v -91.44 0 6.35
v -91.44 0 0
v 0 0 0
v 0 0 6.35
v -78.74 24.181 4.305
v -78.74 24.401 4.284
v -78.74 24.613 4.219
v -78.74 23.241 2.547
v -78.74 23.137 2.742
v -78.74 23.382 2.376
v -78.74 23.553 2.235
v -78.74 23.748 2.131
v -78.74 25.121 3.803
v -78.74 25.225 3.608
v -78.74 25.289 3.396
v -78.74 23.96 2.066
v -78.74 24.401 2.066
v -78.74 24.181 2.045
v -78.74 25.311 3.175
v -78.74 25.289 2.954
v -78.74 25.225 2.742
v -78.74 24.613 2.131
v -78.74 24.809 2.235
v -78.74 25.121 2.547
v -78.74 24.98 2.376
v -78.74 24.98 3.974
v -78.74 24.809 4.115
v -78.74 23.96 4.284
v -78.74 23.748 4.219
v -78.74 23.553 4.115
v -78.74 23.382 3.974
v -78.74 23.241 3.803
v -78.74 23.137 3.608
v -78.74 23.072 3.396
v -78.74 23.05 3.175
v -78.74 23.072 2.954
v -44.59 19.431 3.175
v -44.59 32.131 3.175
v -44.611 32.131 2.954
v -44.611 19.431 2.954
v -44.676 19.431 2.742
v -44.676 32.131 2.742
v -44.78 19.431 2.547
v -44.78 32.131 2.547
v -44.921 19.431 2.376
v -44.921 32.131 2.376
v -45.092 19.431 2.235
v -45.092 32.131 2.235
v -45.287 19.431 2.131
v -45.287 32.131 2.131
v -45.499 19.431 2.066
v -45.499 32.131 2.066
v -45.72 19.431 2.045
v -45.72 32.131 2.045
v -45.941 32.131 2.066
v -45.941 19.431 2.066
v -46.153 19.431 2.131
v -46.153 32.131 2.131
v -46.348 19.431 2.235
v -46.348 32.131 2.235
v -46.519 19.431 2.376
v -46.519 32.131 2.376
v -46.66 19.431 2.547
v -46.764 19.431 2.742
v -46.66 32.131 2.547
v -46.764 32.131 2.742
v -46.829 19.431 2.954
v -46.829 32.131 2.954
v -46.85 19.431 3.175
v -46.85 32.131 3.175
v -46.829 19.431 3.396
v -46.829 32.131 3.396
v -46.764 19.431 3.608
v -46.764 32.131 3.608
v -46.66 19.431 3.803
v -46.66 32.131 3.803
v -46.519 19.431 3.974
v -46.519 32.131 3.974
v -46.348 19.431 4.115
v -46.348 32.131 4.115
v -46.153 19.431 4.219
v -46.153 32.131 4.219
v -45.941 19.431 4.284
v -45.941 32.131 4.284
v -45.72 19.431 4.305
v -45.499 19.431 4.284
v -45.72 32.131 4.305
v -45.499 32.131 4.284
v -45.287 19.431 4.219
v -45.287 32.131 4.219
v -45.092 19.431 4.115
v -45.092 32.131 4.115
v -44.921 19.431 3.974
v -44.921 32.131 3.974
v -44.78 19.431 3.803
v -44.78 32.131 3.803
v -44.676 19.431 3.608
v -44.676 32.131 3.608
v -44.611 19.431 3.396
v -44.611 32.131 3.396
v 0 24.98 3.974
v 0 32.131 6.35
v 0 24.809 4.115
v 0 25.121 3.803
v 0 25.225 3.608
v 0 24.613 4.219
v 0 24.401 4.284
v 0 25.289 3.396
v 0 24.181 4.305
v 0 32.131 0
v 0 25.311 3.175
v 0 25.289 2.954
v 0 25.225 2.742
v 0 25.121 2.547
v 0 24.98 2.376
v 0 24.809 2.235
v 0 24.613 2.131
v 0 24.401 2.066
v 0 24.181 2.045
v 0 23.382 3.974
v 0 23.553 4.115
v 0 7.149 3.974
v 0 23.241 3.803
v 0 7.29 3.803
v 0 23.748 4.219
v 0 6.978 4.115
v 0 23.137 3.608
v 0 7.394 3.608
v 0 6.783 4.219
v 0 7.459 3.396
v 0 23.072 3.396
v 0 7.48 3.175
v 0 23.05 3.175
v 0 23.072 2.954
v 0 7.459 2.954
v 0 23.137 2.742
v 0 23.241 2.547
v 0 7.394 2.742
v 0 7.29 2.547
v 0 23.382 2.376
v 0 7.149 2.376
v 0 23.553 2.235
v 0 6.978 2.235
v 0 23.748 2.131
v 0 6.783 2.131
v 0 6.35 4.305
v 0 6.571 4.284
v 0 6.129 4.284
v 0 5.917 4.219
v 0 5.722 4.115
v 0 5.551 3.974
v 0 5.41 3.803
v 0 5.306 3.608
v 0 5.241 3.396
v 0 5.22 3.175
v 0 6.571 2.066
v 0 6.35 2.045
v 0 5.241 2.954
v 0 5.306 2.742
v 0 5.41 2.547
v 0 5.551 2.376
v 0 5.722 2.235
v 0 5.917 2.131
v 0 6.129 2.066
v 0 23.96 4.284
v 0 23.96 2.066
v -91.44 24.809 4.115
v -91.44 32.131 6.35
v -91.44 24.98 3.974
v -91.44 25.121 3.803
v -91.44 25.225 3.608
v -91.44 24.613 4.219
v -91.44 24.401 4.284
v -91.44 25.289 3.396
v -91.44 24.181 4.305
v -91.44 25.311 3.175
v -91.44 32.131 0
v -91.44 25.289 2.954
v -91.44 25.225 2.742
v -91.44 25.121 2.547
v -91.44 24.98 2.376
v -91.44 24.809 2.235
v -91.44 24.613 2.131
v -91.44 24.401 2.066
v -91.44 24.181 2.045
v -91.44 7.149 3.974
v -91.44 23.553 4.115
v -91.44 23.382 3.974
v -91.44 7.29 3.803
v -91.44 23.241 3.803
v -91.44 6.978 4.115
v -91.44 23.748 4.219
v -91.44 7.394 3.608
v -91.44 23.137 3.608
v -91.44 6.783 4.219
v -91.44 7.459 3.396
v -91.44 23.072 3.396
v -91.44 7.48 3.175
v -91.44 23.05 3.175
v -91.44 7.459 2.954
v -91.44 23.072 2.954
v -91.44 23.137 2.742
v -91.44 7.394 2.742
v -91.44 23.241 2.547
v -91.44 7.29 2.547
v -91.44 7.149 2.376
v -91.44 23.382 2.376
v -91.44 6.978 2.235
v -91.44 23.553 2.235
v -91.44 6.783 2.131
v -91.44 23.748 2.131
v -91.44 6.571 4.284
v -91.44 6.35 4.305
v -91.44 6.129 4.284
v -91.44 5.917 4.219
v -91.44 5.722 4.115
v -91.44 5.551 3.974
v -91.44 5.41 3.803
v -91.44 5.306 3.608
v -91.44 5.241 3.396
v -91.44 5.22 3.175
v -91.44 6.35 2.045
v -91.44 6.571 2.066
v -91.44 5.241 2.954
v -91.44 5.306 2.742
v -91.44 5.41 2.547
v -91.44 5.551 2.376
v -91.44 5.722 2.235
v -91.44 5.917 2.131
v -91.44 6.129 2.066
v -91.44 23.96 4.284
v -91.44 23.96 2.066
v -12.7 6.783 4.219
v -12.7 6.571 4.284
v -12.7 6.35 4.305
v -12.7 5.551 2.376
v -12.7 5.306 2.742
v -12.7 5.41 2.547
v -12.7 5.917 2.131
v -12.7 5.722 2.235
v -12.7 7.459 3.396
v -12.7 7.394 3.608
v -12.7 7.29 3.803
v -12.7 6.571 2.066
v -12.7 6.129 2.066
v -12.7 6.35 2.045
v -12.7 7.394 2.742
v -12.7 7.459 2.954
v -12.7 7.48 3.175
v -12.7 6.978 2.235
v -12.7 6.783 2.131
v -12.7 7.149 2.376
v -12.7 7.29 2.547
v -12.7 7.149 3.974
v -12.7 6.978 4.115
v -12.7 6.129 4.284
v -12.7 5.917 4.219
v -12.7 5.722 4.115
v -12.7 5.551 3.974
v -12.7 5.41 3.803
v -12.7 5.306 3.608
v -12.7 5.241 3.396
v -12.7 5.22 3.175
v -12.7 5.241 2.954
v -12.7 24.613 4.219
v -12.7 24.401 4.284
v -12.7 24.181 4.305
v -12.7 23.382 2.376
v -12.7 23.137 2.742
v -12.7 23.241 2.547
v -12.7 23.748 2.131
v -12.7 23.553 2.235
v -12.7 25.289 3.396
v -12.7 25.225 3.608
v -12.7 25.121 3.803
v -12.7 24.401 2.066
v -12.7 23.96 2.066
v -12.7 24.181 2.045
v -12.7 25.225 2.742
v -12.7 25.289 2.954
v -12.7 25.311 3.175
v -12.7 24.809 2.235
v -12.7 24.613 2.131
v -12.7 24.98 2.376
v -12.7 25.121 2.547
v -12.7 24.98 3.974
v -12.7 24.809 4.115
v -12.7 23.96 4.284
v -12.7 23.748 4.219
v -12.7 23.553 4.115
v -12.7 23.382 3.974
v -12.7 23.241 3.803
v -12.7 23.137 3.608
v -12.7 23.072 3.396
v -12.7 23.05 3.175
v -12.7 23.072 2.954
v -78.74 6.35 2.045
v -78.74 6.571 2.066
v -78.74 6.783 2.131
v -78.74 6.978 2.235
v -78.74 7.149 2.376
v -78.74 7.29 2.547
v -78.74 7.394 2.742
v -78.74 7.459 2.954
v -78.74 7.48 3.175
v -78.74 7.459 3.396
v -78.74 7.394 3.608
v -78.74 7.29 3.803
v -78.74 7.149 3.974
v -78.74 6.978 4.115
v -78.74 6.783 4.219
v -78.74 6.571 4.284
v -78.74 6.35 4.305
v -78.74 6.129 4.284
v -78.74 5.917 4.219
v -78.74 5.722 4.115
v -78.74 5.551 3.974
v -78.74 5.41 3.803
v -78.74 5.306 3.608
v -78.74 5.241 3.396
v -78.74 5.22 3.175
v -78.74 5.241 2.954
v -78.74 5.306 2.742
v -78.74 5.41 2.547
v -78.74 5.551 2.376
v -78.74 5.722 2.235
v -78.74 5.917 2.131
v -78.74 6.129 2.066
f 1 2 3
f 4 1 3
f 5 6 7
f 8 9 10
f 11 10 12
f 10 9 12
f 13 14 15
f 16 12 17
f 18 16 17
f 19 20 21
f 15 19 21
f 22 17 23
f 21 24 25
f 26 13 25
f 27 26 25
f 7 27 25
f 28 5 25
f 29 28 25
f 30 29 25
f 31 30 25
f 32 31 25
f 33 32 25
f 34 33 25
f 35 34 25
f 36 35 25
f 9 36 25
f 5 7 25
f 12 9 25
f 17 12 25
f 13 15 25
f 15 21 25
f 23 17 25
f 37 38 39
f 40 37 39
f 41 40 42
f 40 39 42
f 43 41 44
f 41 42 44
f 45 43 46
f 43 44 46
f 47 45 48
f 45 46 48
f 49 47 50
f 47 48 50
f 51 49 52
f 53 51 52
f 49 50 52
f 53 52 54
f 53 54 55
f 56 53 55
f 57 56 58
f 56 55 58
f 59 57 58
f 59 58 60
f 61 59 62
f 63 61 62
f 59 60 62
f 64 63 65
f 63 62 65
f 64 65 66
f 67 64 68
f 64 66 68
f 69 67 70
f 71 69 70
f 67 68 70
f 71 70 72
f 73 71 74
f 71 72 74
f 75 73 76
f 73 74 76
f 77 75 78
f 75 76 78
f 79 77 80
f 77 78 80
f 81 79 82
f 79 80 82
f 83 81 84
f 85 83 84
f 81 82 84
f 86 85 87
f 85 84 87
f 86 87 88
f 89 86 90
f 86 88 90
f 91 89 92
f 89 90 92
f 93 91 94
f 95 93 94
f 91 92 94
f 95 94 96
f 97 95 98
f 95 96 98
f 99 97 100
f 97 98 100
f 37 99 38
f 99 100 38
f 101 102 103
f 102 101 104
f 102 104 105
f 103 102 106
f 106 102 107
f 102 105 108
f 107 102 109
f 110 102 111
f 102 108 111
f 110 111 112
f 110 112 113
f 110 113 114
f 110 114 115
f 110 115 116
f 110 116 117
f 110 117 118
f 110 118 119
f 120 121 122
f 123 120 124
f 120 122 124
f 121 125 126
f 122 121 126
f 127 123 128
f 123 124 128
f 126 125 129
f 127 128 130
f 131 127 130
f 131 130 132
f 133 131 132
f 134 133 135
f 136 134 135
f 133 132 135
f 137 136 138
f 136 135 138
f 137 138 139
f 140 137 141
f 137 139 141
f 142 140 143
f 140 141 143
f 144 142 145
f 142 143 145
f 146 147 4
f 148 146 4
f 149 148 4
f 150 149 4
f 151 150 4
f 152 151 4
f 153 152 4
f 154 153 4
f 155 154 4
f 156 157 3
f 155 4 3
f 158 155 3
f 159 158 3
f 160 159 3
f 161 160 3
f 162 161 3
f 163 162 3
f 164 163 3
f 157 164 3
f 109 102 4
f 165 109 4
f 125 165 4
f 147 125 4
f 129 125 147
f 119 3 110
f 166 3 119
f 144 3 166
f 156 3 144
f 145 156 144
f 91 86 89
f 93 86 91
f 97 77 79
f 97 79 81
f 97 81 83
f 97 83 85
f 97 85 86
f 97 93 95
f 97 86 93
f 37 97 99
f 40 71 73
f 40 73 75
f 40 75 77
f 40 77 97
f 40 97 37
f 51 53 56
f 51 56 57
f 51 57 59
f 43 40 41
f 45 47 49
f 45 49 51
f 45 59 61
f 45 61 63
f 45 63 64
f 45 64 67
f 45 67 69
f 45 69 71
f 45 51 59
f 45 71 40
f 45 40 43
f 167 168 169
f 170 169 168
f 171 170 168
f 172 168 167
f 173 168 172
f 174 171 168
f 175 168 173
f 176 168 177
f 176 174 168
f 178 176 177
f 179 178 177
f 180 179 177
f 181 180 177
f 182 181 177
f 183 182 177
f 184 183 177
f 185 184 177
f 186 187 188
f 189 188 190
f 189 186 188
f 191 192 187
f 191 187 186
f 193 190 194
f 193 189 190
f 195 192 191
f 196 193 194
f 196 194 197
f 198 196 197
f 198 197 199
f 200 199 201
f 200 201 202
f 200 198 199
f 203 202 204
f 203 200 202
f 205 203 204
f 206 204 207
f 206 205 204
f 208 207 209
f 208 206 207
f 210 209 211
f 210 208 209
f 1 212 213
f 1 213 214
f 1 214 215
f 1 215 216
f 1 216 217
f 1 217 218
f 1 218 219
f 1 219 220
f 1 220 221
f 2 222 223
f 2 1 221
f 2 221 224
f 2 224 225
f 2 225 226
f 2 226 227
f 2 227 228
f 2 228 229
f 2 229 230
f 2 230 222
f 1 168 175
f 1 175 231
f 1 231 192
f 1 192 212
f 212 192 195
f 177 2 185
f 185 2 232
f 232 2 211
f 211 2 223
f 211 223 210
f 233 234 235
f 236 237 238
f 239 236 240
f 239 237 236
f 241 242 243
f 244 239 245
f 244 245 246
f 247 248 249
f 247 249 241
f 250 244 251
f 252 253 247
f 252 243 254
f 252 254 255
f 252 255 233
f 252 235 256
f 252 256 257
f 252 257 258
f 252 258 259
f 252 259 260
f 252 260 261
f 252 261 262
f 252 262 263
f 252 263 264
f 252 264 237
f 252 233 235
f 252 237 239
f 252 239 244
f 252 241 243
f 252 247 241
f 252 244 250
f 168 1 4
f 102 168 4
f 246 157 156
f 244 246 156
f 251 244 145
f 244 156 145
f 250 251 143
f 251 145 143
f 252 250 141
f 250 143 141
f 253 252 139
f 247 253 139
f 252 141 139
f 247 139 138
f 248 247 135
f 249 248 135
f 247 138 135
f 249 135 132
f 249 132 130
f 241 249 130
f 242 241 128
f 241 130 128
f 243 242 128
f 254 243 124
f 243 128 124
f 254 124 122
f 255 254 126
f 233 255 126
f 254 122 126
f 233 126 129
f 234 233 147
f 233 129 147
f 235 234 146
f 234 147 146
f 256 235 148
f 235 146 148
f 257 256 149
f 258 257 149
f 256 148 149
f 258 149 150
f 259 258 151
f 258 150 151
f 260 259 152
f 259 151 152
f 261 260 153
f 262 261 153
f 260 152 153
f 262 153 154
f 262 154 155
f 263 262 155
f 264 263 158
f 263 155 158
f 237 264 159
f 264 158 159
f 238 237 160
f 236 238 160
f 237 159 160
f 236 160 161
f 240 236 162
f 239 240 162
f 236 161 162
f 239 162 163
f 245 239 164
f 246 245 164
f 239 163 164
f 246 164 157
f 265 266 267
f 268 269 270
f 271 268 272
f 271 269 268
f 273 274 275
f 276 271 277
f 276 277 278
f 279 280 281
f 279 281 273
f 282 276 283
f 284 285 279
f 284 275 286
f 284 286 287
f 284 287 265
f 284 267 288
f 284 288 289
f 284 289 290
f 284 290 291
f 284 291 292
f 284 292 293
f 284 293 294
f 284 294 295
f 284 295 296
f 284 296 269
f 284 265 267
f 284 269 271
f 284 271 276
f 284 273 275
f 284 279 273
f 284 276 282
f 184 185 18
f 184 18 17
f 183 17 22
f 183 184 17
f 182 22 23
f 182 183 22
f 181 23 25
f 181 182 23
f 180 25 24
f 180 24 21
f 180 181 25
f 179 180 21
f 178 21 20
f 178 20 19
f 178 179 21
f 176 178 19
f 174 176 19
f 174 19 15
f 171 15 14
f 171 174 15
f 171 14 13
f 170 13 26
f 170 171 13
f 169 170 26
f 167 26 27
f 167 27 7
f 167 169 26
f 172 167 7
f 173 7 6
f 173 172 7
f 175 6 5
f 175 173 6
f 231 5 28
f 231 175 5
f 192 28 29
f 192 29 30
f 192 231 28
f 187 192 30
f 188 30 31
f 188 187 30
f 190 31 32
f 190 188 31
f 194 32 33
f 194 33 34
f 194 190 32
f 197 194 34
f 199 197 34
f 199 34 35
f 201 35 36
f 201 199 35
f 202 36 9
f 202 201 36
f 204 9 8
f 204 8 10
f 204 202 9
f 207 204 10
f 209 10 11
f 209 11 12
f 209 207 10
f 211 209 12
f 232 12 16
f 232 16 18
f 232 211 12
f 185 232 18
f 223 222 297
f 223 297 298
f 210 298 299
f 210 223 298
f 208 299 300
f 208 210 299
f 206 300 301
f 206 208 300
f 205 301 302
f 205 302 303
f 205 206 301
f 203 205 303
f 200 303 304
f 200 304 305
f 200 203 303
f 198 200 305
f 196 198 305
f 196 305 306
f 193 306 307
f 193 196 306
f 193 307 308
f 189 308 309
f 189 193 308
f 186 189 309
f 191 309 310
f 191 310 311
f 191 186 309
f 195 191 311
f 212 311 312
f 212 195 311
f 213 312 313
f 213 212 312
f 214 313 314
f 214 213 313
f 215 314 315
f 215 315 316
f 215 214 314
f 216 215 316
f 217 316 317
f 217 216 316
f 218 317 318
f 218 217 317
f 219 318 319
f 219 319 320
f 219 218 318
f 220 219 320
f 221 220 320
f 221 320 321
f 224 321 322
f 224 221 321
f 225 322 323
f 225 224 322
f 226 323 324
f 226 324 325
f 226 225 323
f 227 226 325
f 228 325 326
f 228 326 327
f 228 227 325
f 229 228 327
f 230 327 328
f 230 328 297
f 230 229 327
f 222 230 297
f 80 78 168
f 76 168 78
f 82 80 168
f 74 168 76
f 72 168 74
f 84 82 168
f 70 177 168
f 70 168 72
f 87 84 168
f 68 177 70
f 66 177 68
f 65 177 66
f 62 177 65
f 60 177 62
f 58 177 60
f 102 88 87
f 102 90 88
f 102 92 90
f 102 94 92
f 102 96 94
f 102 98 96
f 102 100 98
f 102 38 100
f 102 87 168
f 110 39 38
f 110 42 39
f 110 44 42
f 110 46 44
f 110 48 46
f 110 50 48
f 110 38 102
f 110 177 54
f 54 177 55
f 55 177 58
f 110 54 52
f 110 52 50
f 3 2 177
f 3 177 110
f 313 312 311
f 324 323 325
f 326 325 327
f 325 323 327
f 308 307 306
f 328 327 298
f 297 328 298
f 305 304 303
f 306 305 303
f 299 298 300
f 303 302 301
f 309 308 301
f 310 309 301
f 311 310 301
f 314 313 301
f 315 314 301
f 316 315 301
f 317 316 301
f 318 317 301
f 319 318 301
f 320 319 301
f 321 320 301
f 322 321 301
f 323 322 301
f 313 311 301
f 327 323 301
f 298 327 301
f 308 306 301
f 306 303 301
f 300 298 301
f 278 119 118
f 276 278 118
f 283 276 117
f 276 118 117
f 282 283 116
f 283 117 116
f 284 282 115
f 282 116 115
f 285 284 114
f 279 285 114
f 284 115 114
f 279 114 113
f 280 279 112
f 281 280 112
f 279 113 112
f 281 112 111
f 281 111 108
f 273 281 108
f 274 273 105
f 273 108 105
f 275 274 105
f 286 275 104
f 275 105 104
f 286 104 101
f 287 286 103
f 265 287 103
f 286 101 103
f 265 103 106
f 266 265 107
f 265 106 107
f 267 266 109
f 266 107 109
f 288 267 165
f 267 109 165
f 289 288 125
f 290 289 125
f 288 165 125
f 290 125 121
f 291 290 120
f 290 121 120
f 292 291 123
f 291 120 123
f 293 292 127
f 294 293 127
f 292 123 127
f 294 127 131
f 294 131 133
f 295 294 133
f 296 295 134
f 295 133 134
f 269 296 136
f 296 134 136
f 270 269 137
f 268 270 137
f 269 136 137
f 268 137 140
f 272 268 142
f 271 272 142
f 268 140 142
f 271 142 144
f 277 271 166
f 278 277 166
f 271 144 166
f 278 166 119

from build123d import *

# Parameters (mm, degrees)
SKETCH1_W           = 91.44
SKETCH1_H           = 6.35
BOSS_EXTRUDE1_DEPTH = 32.131
SKETCH2_R           = 1.1303
CUT_EXTRUDE1_DEPTH  = 12.7
SKETCH3_R           = 1.1303
CUT_EXTRUDE2_DEPTH  = 12.7


with BuildPart() as part:
    # Sketch1 → Boss-Extrude1 (new body)
    with BuildSketch(Plane(origin=(0, 0, 0), x_dir=(1, 0, 0), z_dir=(0, 1, 0))):
        with Locations((-45.72, -3.175)):
            Rectangle(SKETCH1_W, SKETCH1_H)
    extrude(amount=BOSS_EXTRUDE1_DEPTH)

    # Sketch2 → Cut-Extrude1 (cut)
    with BuildSketch(Plane(origin=(0, 0, 0), x_dir=(0, 0, -1), z_dir=(1, 0, 0))):
        with Locations((-3.175, 24.1808)):
            Circle(SKETCH2_R)
        with Locations((-3.175, 6.35)):
            Circle(SKETCH2_R)
    cut_extrude1 = extrude(amount=-CUT_EXTRUDE1_DEPTH, mode=Mode.SUBTRACT)

    # Mirror2: Cut-Extrude1 across plane
    add(cut_extrude1.mirror(Plane(origin=(-45.72, 0, 0), x_dir=(0, 0, 1), z_dir=(1, 0, 0))), mode=Mode.SUBTRACT)

    # Sketch3 → Cut-Extrude2 (cut)
    with BuildSketch(Plane(origin=(0, 32.131, 0), x_dir=(1, 0, 0), z_dir=(0, 1, 0))):
        with Locations((-45.72, -3.175)):
            Circle(SKETCH3_R)
    extrude(amount=-CUT_EXTRUDE2_DEPTH, mode=Mode.SUBTRACT)


solid = part.part
